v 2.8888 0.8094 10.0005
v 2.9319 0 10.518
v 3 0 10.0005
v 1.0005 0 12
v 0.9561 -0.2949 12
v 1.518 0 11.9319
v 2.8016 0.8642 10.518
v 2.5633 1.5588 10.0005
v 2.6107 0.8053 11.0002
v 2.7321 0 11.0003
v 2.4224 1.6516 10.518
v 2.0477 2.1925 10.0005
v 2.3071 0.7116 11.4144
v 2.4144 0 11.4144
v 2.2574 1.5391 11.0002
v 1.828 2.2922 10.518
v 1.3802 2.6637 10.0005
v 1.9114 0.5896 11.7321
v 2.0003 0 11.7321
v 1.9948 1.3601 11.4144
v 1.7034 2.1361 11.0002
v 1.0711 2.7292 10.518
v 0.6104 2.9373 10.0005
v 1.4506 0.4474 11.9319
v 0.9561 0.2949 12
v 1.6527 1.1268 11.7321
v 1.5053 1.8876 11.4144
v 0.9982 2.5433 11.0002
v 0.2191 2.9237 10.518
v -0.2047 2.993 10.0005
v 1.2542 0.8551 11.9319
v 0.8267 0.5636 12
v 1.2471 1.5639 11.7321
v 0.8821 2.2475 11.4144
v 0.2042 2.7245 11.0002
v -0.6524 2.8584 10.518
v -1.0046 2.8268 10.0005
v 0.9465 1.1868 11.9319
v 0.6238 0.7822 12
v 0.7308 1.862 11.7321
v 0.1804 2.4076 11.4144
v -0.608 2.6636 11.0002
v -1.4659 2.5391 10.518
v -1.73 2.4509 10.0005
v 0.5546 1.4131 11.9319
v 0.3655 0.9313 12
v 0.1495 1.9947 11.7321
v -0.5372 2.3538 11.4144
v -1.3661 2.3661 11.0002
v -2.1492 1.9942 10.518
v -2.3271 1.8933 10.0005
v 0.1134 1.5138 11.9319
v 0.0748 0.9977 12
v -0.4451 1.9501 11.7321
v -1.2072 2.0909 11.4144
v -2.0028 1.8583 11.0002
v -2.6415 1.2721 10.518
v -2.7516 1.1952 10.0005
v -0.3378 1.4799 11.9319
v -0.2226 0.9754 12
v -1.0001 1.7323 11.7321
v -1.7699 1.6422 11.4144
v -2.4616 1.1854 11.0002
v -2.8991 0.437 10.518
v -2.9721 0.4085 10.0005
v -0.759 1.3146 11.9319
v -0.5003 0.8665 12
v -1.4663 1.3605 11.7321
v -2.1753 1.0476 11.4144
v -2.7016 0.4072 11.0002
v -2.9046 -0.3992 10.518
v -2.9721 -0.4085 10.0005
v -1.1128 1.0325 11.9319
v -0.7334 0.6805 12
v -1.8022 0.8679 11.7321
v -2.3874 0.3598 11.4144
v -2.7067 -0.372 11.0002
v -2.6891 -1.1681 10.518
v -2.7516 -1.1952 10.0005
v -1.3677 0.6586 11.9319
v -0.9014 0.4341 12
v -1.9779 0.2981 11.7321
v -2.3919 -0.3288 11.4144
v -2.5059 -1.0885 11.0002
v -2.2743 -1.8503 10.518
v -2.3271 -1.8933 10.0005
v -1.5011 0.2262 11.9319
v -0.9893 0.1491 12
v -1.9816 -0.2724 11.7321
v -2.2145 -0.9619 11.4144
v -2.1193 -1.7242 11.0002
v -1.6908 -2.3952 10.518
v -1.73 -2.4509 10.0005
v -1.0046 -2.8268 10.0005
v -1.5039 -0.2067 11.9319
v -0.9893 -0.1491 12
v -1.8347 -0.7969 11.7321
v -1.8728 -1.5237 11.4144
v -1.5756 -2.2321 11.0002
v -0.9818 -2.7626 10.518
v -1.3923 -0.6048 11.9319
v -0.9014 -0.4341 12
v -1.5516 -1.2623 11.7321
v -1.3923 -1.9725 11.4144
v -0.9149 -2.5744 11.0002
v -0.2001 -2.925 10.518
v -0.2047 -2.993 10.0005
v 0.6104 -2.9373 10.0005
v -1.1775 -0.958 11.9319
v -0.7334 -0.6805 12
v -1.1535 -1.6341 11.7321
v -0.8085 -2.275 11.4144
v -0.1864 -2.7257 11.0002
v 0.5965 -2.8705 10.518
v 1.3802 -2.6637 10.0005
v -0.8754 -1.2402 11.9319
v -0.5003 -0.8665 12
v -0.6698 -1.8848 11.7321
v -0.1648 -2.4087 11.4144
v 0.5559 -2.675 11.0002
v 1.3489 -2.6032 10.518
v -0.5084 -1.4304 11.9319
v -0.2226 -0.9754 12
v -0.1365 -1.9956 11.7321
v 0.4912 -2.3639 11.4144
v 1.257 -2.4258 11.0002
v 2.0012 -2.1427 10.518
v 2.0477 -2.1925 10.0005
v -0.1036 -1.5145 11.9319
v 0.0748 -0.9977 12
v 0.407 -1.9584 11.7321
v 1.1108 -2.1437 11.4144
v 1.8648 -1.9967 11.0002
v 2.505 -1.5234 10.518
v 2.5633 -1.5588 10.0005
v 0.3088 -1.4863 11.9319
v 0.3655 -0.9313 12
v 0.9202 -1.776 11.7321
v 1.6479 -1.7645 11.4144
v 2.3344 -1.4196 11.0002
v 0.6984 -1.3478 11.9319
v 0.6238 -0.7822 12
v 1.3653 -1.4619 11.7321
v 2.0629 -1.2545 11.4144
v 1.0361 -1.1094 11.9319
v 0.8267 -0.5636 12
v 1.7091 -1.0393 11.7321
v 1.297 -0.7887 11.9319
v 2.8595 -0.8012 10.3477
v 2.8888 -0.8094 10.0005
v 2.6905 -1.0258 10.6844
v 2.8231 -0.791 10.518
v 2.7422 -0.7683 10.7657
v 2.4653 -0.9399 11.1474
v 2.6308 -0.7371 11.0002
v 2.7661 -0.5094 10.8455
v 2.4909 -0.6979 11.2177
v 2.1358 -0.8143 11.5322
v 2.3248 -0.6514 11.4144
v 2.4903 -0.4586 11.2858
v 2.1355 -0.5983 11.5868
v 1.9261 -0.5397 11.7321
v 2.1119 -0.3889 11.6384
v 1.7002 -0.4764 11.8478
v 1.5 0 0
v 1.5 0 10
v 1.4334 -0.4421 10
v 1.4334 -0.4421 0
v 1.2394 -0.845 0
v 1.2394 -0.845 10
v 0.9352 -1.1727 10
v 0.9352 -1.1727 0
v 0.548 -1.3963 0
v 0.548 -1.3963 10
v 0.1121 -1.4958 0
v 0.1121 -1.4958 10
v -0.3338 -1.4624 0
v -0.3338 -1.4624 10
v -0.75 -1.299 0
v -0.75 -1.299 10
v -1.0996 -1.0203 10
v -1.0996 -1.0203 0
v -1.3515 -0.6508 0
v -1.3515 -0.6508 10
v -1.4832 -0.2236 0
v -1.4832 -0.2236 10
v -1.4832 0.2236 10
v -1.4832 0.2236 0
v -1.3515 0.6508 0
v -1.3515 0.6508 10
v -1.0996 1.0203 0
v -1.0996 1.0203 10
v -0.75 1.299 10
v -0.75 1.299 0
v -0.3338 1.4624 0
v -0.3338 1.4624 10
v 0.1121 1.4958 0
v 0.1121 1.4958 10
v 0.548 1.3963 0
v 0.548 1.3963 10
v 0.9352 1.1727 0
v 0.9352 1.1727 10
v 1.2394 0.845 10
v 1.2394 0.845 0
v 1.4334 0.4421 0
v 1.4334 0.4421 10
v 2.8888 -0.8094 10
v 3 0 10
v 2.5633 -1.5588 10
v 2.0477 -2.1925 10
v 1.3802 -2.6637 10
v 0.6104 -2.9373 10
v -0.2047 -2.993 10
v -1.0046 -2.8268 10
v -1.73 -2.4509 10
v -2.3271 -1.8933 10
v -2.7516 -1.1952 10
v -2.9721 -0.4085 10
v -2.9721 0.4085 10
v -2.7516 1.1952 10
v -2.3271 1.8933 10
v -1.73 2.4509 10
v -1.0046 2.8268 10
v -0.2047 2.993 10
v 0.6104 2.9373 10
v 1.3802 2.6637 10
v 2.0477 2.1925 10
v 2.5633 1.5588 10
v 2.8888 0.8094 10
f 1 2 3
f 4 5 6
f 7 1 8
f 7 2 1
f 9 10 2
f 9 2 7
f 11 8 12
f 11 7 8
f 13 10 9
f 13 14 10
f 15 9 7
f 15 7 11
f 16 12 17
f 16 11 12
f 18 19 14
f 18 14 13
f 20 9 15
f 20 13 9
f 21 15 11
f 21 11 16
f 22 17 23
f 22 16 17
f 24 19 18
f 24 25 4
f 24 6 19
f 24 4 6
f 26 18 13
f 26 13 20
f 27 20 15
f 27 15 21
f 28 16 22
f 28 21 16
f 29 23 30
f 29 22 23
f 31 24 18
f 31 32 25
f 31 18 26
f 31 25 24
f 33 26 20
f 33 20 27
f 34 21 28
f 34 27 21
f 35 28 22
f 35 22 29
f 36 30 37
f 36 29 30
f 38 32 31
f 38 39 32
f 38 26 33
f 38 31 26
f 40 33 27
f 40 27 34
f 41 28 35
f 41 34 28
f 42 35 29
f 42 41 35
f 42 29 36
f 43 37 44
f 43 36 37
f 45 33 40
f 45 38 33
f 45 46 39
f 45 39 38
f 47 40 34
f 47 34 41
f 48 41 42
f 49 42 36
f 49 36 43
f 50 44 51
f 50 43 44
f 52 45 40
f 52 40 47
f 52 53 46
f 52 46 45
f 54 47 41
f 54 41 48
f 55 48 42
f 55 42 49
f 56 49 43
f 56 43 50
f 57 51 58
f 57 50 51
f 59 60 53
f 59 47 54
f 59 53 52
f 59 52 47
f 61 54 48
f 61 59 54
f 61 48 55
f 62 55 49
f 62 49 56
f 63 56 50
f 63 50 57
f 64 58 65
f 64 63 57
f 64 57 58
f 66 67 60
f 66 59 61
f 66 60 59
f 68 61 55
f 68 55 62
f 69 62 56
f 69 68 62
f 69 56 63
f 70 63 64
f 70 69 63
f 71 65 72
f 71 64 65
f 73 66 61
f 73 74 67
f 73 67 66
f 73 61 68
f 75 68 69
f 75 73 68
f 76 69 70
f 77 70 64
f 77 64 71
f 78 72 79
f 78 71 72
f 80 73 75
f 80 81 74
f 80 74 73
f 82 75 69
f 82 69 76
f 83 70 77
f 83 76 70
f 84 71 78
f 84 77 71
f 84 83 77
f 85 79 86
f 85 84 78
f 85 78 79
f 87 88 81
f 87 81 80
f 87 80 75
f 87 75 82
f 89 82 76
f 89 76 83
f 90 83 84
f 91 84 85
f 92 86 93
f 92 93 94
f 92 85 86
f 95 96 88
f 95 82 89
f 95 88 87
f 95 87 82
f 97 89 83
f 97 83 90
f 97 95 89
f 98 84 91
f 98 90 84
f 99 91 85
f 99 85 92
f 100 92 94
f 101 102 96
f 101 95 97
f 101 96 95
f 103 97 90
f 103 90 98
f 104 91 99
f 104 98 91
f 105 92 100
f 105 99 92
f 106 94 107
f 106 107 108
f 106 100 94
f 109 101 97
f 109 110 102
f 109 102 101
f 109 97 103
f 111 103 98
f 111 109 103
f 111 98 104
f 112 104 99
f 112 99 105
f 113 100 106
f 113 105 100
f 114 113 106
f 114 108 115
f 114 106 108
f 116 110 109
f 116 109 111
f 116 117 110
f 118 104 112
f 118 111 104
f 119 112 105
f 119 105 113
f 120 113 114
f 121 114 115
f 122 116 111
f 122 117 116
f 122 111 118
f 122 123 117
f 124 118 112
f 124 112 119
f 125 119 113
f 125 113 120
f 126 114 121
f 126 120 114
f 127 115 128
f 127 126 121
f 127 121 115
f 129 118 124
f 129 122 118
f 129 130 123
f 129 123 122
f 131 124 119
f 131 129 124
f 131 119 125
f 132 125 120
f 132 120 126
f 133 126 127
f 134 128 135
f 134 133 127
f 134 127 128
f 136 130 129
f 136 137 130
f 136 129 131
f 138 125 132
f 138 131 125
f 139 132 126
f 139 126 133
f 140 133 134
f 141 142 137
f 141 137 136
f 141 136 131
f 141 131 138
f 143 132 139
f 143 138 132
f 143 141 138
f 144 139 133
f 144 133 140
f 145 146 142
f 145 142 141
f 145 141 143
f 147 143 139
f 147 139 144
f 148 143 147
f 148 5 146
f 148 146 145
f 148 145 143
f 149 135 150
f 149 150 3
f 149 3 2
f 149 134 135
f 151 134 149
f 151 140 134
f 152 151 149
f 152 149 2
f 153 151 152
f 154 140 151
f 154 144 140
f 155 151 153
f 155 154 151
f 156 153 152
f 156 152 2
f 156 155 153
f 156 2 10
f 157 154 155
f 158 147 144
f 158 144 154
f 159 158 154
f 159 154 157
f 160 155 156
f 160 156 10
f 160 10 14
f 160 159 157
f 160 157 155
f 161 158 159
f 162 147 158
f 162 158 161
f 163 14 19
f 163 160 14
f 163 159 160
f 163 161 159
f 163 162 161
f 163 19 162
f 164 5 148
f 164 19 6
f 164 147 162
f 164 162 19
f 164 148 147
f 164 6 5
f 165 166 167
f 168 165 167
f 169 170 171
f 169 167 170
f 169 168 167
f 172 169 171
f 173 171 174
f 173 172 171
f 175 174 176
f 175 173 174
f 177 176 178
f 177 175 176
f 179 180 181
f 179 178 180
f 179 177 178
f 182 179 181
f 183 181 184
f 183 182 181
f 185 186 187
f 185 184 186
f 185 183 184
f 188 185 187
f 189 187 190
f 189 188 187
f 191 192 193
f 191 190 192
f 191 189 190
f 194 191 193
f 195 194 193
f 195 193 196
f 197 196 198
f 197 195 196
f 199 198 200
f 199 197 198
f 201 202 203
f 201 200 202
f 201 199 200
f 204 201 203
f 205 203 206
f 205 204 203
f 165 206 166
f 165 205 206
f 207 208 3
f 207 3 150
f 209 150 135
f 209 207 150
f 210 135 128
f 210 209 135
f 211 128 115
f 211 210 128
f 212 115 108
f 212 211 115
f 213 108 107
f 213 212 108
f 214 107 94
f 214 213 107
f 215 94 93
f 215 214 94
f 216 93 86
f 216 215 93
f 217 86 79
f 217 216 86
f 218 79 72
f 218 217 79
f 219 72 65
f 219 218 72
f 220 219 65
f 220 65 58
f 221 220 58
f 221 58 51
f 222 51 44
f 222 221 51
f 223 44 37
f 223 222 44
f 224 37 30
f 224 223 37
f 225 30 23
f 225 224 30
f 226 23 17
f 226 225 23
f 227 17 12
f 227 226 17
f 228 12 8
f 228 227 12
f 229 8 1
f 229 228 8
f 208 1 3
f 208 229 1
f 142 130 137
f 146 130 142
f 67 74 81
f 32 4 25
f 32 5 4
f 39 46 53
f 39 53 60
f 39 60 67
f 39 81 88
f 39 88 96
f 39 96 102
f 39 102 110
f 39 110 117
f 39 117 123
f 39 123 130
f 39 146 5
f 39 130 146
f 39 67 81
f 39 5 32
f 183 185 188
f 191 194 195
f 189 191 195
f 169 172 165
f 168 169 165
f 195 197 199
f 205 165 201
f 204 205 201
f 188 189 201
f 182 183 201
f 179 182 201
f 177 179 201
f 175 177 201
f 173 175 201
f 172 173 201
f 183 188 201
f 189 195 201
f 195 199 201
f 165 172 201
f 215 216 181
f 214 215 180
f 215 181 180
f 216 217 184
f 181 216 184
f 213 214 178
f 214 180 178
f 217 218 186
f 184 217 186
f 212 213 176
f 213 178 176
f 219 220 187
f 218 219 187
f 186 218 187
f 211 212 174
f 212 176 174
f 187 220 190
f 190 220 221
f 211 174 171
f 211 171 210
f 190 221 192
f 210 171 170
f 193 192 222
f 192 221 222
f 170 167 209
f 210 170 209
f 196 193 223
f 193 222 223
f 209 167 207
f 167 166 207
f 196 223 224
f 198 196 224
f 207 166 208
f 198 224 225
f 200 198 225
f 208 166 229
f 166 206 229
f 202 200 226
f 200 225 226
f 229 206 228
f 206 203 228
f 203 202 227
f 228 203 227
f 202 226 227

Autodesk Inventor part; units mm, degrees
ref_plane "YZ Plane" through (0, 0, 0) normal (1, 0, 0) x (0, 1, 0)
ref_plane "XZ Plane" through (0, 0, 0) normal (0, 1, 0) x (-1, 0, 0)
ref_plane "XY Plane" through (0, 0, 0) normal (0, 0, 1) x (1, 0, 0)
sketch "スケッチ1" plane through (0, 0, 0) normal (0, 0, 1) x (1, 0, 0)
  circle A0 centre (0, 0) radius 1.5
  dimension "d0" = 3
extrude "押し出し1" add sketch "スケッチ1" along normal blind 10
sketch "スケッチ2" plane through (0, 0, 10) normal (0, 0, 1) x (1, 0, 0)
  circle A0 centre (0, 0) radius 1.5 projected
  circle A1 centre (0, 0) radius 3
  dimension "d3" = 6
extrude "押し出し2" add sketch "スケッチ2" along normal blind 2 contours A0 | A1
fillet "フィレット1" radius 2 1 edges at (-3, 0, 12)
properties part number "M3ボタンボルト10" material "鋼、高強度、低合金"
